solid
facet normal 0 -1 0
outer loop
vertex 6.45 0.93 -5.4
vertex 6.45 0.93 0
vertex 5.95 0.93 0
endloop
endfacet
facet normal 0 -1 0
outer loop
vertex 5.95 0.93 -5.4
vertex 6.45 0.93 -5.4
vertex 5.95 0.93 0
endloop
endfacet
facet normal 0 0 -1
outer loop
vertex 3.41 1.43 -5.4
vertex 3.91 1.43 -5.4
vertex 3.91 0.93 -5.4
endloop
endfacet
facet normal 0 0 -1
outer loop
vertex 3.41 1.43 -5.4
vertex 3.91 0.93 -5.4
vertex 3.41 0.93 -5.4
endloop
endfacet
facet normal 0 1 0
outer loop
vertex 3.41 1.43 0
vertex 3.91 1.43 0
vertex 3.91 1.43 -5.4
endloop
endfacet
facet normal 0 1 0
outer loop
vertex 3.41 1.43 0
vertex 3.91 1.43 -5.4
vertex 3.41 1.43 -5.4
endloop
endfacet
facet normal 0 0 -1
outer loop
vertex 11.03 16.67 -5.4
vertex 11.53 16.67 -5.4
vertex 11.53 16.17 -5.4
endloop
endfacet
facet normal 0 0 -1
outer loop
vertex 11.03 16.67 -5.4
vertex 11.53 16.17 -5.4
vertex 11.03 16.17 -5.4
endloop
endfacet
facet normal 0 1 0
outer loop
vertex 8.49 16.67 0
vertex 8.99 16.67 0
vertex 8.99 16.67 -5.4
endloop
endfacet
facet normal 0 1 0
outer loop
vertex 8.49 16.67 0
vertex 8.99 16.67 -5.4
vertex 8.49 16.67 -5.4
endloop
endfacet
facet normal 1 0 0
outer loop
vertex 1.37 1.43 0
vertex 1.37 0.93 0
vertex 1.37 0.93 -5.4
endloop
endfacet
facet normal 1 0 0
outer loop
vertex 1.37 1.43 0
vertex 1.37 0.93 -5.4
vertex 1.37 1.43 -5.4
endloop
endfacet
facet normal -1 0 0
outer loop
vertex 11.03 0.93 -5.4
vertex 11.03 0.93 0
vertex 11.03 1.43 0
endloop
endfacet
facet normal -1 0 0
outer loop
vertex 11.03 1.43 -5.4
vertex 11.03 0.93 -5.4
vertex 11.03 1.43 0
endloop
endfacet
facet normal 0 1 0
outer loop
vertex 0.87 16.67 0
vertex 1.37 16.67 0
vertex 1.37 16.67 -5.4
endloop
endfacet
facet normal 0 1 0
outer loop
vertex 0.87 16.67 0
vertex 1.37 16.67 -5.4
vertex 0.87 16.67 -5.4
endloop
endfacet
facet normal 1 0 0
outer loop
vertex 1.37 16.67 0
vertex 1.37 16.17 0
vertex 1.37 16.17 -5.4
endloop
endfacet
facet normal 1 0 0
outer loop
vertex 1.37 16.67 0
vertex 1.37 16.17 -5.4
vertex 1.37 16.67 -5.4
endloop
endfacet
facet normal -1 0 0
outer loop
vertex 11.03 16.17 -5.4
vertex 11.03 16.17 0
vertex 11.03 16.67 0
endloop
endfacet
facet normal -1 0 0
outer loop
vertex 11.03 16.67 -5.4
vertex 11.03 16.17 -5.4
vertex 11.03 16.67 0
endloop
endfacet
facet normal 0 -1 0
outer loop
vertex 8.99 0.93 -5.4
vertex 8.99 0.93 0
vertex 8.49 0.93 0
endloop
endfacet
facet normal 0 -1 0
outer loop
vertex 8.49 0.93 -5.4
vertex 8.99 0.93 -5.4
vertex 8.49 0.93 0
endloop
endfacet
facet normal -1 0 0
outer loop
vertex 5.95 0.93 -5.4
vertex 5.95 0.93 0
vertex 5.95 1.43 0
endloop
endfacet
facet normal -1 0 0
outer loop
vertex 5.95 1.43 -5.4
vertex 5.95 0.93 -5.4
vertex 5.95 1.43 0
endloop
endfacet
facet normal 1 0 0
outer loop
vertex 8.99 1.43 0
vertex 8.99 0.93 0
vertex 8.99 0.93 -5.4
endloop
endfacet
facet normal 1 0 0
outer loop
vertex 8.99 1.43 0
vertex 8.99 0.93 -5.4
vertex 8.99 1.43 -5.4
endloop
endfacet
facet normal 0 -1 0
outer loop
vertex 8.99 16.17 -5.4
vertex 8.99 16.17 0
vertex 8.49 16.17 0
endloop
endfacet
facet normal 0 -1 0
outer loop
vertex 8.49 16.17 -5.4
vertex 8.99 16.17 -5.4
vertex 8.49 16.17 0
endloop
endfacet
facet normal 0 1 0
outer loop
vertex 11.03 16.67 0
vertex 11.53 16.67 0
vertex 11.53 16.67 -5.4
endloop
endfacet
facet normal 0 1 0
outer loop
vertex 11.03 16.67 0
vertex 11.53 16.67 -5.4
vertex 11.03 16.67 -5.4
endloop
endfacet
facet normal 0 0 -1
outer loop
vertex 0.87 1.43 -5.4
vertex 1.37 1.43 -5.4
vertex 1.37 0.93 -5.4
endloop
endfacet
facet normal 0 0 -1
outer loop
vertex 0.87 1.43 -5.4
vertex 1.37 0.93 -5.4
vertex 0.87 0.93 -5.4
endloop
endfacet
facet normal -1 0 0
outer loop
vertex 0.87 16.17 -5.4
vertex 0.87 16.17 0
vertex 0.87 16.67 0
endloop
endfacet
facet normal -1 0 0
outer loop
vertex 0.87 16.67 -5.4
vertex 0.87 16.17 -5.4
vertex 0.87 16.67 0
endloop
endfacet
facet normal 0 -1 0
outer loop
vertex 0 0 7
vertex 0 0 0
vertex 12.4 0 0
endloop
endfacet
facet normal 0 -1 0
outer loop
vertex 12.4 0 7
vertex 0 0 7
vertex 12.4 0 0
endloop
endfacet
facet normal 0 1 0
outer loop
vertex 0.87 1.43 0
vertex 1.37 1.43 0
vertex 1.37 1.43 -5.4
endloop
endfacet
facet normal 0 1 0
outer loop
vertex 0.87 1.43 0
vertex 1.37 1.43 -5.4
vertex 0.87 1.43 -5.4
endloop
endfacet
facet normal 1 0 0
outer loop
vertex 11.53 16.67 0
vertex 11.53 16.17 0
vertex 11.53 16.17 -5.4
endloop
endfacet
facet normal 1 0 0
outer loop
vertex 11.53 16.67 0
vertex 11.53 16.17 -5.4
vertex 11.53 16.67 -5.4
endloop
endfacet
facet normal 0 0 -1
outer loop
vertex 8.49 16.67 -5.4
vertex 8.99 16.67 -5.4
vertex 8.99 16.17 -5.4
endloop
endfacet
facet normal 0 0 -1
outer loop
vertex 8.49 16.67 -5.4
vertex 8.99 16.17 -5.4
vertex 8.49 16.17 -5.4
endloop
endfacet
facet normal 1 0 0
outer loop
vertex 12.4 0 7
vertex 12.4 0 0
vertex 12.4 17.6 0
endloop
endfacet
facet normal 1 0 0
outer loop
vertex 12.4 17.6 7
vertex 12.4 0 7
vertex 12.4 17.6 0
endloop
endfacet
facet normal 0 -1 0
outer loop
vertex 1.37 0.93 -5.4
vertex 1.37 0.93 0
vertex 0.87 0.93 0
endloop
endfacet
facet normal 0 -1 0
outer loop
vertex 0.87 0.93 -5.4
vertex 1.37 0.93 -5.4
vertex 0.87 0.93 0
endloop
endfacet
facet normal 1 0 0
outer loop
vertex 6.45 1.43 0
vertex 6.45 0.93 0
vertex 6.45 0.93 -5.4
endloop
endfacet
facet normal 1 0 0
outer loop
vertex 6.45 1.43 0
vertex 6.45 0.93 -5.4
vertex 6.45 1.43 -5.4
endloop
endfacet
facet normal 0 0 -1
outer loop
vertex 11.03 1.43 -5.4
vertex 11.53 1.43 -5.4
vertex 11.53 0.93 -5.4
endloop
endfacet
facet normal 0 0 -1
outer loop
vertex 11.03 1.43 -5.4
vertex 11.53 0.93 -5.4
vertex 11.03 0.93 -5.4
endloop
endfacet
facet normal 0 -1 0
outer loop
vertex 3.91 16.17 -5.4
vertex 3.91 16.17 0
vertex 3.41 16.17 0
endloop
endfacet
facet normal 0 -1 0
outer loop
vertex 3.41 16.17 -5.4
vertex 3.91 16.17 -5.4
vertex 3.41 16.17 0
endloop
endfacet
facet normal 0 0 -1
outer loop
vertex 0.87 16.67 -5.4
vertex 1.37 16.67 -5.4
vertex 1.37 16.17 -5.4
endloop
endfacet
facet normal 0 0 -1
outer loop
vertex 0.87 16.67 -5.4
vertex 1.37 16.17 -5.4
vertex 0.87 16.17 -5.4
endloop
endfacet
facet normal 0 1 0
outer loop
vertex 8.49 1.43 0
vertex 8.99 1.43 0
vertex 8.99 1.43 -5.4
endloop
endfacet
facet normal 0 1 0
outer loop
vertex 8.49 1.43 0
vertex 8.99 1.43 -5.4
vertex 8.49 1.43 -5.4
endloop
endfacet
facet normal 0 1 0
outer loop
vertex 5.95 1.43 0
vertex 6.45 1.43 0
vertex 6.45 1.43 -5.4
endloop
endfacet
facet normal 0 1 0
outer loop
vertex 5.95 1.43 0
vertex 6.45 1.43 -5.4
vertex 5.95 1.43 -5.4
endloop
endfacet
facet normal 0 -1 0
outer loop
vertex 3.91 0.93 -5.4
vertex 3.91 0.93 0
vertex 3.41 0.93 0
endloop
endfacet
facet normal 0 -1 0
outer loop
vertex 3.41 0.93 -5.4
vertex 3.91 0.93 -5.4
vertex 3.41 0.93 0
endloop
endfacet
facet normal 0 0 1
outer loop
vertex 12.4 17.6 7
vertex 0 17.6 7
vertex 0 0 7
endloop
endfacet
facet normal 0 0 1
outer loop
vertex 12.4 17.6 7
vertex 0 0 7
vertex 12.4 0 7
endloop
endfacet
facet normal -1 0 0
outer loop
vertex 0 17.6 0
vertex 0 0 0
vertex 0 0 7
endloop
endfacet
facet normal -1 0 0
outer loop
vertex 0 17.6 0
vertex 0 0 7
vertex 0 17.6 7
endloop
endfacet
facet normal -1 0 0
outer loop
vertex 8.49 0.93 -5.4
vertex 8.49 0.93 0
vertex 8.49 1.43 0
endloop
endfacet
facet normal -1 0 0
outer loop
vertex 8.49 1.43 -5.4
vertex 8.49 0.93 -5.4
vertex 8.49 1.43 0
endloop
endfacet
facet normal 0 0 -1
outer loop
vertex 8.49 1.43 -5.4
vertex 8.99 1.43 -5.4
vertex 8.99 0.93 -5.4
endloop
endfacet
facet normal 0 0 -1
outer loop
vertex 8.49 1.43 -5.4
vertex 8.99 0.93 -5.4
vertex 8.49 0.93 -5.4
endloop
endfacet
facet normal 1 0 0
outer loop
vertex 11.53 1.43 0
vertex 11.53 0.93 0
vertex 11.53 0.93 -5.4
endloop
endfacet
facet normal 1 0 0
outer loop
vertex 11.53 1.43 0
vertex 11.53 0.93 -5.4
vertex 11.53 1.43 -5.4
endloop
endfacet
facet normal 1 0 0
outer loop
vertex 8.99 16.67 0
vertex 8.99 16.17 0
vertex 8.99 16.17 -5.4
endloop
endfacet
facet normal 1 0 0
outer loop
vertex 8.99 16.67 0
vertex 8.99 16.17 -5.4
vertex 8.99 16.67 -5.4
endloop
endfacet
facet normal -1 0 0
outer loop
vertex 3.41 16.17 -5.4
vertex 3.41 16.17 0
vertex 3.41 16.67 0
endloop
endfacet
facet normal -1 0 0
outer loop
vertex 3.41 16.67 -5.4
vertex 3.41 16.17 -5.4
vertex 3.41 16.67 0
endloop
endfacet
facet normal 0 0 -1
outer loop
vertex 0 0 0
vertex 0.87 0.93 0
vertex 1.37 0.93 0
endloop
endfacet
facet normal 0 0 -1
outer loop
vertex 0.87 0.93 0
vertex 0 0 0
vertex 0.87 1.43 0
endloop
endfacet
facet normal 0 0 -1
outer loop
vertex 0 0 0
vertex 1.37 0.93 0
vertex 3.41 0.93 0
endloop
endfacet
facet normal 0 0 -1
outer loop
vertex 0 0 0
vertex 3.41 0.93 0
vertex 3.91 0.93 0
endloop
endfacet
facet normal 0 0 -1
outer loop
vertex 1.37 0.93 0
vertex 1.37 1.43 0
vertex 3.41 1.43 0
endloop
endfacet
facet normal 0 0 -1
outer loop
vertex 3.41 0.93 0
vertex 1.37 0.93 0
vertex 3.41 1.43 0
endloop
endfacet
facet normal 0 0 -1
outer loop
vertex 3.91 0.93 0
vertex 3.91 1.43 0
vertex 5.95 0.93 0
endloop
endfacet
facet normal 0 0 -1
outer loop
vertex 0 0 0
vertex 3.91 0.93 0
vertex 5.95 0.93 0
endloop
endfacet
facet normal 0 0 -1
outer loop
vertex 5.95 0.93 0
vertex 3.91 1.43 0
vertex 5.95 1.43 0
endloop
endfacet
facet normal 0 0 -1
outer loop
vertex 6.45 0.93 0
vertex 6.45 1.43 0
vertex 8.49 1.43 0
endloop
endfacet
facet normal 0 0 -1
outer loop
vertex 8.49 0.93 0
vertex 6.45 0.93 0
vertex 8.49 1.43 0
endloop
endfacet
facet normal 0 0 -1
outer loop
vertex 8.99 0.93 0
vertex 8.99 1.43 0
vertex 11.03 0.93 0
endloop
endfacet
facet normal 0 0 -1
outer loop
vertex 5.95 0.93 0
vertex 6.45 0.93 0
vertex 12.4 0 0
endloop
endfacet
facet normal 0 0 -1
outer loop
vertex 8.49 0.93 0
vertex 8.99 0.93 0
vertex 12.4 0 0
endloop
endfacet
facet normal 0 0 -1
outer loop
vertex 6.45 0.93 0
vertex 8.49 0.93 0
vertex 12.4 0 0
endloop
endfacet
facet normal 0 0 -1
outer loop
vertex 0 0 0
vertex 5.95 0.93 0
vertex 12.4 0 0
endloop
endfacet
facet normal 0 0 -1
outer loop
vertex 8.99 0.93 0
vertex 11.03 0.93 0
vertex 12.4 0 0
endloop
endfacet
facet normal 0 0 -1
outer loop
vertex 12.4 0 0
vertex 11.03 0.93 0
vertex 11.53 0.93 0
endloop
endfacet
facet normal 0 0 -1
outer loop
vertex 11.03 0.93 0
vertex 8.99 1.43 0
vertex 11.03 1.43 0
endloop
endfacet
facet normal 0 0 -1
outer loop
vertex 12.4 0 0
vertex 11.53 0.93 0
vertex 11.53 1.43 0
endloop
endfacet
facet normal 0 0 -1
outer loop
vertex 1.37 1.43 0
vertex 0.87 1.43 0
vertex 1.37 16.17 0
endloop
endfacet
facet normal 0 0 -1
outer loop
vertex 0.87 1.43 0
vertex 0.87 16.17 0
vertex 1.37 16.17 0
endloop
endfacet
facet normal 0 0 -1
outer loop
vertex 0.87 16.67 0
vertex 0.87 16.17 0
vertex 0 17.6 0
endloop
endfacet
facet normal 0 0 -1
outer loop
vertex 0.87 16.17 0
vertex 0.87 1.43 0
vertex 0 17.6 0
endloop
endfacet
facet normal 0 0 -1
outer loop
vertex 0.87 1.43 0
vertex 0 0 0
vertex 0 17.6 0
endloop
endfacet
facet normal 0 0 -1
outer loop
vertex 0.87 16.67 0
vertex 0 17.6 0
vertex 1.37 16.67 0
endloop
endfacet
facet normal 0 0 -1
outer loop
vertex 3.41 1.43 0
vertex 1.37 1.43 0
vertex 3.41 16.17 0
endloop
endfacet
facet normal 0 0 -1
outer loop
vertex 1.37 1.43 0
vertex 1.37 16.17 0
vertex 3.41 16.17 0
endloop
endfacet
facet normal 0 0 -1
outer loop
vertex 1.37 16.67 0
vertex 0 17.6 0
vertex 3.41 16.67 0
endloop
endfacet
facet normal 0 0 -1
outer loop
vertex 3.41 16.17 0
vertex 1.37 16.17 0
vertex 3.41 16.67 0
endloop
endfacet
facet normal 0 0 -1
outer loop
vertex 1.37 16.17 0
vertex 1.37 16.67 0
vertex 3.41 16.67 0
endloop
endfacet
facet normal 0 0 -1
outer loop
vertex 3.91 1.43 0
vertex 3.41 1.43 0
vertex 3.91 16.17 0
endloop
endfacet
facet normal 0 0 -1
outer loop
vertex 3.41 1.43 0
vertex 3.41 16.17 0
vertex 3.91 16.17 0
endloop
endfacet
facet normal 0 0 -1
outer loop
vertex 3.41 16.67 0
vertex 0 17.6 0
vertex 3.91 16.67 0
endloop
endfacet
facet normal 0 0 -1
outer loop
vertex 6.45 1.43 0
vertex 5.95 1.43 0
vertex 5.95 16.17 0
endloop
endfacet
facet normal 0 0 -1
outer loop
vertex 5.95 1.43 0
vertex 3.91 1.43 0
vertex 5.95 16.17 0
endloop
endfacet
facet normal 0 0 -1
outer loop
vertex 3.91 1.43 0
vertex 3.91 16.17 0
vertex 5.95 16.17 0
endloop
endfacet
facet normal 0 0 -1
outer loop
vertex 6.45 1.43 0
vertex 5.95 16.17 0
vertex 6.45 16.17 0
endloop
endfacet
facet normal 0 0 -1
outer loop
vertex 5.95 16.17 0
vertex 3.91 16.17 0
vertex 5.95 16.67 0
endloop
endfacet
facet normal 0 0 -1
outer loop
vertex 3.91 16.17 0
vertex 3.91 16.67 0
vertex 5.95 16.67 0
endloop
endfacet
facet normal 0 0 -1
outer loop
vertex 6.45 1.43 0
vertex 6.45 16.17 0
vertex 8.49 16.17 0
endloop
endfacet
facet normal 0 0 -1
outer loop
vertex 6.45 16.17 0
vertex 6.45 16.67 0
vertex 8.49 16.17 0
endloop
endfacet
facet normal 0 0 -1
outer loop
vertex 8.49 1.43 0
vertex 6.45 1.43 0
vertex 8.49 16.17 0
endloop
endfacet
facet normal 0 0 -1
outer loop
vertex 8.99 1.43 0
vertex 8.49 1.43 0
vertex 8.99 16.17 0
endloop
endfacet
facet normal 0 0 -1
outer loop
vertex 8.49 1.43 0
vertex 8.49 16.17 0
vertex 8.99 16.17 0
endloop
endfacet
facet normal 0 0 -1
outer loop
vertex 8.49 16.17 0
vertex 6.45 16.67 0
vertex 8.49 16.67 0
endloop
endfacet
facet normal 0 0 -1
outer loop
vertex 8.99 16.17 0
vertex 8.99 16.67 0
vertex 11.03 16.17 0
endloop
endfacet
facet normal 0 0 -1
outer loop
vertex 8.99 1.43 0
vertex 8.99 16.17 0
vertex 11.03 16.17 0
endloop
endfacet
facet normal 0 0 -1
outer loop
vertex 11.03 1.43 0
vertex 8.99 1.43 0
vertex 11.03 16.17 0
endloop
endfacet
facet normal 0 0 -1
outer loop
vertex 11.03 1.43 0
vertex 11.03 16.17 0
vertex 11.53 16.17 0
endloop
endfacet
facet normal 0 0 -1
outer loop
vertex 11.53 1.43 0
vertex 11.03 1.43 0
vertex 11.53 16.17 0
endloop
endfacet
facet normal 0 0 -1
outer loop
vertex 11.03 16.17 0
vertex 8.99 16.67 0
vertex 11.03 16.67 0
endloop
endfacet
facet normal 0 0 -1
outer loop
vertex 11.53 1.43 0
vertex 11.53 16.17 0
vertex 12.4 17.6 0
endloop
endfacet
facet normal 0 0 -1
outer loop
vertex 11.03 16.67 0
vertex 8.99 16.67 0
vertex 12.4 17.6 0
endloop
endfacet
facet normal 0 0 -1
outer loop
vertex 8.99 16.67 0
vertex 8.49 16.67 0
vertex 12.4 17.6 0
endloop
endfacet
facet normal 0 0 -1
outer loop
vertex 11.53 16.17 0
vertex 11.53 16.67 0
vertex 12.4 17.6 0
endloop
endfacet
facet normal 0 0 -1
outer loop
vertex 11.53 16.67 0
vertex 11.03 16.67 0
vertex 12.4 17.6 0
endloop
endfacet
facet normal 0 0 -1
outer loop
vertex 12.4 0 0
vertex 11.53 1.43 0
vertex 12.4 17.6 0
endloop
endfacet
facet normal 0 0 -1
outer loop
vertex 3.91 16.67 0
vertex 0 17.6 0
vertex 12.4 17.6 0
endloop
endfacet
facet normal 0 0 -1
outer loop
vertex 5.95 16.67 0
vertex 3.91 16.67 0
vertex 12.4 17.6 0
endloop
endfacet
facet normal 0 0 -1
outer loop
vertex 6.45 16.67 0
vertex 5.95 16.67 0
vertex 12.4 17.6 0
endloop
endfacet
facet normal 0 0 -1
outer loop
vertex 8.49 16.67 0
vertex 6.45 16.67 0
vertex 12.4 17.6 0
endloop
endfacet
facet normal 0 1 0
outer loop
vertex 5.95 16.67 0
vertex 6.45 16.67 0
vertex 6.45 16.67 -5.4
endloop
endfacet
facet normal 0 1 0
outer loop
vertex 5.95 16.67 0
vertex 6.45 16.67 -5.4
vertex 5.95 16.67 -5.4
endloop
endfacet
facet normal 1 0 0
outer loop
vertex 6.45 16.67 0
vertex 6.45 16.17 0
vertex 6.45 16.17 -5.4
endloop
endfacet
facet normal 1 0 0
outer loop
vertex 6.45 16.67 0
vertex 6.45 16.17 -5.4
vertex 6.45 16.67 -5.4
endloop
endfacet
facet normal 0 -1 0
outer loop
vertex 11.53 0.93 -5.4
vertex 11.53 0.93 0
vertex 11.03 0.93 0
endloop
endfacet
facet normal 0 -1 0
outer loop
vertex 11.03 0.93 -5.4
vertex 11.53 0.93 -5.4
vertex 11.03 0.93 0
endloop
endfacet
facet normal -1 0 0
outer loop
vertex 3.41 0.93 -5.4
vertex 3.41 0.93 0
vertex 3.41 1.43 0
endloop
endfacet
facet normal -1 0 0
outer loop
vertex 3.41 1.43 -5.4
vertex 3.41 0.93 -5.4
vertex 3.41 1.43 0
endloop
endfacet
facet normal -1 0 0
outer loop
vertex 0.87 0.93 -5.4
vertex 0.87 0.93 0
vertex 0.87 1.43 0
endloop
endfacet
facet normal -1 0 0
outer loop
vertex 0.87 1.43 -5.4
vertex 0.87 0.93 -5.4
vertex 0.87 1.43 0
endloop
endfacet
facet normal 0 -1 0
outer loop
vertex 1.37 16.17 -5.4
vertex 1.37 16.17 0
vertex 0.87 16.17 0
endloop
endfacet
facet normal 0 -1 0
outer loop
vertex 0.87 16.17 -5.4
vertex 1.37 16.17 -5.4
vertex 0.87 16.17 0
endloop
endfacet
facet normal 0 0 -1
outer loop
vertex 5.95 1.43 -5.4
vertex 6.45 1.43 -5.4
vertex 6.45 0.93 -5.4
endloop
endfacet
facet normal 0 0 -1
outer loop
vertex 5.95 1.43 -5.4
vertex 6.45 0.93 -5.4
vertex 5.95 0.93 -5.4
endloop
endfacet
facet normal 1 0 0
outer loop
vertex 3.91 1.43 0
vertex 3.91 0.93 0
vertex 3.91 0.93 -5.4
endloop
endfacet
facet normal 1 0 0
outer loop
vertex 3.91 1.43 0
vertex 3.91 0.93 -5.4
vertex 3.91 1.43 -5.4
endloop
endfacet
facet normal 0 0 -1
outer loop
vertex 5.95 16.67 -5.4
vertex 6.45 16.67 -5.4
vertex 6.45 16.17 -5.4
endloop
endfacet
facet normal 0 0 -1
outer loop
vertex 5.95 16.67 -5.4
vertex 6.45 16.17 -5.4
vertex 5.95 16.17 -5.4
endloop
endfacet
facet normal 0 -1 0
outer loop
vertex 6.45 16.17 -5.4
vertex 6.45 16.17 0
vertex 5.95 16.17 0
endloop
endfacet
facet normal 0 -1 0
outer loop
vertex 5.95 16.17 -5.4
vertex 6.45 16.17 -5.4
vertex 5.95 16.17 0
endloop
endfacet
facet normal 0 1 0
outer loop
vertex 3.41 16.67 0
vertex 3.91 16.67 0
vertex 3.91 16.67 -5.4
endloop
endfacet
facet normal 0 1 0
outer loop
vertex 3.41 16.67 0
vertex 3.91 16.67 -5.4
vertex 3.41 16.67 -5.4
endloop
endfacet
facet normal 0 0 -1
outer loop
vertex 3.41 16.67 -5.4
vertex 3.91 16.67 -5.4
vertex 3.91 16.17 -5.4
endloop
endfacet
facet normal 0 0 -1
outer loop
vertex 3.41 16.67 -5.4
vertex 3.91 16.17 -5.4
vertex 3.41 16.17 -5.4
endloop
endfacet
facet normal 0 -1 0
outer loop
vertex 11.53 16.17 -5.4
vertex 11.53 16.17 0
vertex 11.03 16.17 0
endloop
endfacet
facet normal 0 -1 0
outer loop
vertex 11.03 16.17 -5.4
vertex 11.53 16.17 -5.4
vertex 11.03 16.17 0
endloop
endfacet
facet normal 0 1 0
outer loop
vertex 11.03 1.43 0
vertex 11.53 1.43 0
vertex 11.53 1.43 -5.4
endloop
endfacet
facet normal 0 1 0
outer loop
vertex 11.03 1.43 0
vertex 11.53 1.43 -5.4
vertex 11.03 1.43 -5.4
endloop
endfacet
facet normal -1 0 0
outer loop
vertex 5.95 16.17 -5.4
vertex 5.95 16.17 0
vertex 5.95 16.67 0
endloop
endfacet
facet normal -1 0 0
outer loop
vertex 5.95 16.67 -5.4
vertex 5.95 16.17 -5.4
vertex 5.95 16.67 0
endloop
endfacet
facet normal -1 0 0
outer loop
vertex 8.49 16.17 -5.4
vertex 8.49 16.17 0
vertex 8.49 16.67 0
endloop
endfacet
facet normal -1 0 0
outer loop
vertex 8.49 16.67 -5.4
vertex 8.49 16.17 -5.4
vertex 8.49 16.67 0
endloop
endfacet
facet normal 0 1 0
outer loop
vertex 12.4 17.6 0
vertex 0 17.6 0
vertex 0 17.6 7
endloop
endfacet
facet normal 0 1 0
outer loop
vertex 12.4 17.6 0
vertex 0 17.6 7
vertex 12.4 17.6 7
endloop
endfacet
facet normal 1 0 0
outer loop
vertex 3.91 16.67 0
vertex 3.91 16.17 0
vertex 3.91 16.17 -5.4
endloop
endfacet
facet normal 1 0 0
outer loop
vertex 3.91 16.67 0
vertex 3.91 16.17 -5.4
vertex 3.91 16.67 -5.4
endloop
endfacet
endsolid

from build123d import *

# Parameters (mm, degrees)
ESQUISSE1_W                    = 12.4
ESQUISSE1_H                    = 17.6
BOSS_EXTRU_1_DEPTH             = 7
ESQUISSE2_W                    = 0.5
ESQUISSE2_H                    = 0.5
BOSS_EXTRU_2_DEPTH             = 5.4
R_P_TITION_LIN_AIRE1_COUNT     = 3
R_P_TITION_LIN_AIRE1_PITCH     = 2.54
R_P_TITION_LIN_AIRE1_COL_COUNT = 3
R_P_TITION_LIN_AIRE1_COL_PITCH = 2.54


with BuildPart() as part:
    # Esquisse1 → Boss.-Extru.1 (new body)
    with BuildSketch(Plane.XY):
        with Locations((6.2, 8.8)):
            Rectangle(ESQUISSE1_W, ESQUISSE1_H)
    extrude(amount=BOSS_EXTRU_1_DEPTH)

    # Esquisse2 → Boss.-Extru.2 (add)
    with BuildSketch(Plane(origin=(0, 0, 0), x_dir=(-1, 0, 0), z_dir=(0, 0, -1))):
        with Locations((-6.2, 1.18)):
            Rectangle(ESQUISSE2_W, ESQUISSE2_H)
        with Locations((-6.2, 16.42)):
            Rectangle(ESQUISSE2_W, ESQUISSE2_H)
    boss_extru_2 = extrude(amount=BOSS_EXTRU_2_DEPTH)

    # Répétition linéaire1: Boss.-Extru.2 ×3
    with Locations(*[(i * R_P_TITION_LIN_AIRE1_PITCH, 0, 0) for i in range(1, R_P_TITION_LIN_AIRE1_COUNT)]):
        add(boss_extru_2)

    # Répétition linéaire1 col: Boss.-Extru.2 ×3
    with Locations(*[(-i * R_P_TITION_LIN_AIRE1_COL_PITCH, 0, 0) for i in range(1, R_P_TITION_LIN_AIRE1_COL_COUNT)]):
        add(boss_extru_2)


solid = part.part
